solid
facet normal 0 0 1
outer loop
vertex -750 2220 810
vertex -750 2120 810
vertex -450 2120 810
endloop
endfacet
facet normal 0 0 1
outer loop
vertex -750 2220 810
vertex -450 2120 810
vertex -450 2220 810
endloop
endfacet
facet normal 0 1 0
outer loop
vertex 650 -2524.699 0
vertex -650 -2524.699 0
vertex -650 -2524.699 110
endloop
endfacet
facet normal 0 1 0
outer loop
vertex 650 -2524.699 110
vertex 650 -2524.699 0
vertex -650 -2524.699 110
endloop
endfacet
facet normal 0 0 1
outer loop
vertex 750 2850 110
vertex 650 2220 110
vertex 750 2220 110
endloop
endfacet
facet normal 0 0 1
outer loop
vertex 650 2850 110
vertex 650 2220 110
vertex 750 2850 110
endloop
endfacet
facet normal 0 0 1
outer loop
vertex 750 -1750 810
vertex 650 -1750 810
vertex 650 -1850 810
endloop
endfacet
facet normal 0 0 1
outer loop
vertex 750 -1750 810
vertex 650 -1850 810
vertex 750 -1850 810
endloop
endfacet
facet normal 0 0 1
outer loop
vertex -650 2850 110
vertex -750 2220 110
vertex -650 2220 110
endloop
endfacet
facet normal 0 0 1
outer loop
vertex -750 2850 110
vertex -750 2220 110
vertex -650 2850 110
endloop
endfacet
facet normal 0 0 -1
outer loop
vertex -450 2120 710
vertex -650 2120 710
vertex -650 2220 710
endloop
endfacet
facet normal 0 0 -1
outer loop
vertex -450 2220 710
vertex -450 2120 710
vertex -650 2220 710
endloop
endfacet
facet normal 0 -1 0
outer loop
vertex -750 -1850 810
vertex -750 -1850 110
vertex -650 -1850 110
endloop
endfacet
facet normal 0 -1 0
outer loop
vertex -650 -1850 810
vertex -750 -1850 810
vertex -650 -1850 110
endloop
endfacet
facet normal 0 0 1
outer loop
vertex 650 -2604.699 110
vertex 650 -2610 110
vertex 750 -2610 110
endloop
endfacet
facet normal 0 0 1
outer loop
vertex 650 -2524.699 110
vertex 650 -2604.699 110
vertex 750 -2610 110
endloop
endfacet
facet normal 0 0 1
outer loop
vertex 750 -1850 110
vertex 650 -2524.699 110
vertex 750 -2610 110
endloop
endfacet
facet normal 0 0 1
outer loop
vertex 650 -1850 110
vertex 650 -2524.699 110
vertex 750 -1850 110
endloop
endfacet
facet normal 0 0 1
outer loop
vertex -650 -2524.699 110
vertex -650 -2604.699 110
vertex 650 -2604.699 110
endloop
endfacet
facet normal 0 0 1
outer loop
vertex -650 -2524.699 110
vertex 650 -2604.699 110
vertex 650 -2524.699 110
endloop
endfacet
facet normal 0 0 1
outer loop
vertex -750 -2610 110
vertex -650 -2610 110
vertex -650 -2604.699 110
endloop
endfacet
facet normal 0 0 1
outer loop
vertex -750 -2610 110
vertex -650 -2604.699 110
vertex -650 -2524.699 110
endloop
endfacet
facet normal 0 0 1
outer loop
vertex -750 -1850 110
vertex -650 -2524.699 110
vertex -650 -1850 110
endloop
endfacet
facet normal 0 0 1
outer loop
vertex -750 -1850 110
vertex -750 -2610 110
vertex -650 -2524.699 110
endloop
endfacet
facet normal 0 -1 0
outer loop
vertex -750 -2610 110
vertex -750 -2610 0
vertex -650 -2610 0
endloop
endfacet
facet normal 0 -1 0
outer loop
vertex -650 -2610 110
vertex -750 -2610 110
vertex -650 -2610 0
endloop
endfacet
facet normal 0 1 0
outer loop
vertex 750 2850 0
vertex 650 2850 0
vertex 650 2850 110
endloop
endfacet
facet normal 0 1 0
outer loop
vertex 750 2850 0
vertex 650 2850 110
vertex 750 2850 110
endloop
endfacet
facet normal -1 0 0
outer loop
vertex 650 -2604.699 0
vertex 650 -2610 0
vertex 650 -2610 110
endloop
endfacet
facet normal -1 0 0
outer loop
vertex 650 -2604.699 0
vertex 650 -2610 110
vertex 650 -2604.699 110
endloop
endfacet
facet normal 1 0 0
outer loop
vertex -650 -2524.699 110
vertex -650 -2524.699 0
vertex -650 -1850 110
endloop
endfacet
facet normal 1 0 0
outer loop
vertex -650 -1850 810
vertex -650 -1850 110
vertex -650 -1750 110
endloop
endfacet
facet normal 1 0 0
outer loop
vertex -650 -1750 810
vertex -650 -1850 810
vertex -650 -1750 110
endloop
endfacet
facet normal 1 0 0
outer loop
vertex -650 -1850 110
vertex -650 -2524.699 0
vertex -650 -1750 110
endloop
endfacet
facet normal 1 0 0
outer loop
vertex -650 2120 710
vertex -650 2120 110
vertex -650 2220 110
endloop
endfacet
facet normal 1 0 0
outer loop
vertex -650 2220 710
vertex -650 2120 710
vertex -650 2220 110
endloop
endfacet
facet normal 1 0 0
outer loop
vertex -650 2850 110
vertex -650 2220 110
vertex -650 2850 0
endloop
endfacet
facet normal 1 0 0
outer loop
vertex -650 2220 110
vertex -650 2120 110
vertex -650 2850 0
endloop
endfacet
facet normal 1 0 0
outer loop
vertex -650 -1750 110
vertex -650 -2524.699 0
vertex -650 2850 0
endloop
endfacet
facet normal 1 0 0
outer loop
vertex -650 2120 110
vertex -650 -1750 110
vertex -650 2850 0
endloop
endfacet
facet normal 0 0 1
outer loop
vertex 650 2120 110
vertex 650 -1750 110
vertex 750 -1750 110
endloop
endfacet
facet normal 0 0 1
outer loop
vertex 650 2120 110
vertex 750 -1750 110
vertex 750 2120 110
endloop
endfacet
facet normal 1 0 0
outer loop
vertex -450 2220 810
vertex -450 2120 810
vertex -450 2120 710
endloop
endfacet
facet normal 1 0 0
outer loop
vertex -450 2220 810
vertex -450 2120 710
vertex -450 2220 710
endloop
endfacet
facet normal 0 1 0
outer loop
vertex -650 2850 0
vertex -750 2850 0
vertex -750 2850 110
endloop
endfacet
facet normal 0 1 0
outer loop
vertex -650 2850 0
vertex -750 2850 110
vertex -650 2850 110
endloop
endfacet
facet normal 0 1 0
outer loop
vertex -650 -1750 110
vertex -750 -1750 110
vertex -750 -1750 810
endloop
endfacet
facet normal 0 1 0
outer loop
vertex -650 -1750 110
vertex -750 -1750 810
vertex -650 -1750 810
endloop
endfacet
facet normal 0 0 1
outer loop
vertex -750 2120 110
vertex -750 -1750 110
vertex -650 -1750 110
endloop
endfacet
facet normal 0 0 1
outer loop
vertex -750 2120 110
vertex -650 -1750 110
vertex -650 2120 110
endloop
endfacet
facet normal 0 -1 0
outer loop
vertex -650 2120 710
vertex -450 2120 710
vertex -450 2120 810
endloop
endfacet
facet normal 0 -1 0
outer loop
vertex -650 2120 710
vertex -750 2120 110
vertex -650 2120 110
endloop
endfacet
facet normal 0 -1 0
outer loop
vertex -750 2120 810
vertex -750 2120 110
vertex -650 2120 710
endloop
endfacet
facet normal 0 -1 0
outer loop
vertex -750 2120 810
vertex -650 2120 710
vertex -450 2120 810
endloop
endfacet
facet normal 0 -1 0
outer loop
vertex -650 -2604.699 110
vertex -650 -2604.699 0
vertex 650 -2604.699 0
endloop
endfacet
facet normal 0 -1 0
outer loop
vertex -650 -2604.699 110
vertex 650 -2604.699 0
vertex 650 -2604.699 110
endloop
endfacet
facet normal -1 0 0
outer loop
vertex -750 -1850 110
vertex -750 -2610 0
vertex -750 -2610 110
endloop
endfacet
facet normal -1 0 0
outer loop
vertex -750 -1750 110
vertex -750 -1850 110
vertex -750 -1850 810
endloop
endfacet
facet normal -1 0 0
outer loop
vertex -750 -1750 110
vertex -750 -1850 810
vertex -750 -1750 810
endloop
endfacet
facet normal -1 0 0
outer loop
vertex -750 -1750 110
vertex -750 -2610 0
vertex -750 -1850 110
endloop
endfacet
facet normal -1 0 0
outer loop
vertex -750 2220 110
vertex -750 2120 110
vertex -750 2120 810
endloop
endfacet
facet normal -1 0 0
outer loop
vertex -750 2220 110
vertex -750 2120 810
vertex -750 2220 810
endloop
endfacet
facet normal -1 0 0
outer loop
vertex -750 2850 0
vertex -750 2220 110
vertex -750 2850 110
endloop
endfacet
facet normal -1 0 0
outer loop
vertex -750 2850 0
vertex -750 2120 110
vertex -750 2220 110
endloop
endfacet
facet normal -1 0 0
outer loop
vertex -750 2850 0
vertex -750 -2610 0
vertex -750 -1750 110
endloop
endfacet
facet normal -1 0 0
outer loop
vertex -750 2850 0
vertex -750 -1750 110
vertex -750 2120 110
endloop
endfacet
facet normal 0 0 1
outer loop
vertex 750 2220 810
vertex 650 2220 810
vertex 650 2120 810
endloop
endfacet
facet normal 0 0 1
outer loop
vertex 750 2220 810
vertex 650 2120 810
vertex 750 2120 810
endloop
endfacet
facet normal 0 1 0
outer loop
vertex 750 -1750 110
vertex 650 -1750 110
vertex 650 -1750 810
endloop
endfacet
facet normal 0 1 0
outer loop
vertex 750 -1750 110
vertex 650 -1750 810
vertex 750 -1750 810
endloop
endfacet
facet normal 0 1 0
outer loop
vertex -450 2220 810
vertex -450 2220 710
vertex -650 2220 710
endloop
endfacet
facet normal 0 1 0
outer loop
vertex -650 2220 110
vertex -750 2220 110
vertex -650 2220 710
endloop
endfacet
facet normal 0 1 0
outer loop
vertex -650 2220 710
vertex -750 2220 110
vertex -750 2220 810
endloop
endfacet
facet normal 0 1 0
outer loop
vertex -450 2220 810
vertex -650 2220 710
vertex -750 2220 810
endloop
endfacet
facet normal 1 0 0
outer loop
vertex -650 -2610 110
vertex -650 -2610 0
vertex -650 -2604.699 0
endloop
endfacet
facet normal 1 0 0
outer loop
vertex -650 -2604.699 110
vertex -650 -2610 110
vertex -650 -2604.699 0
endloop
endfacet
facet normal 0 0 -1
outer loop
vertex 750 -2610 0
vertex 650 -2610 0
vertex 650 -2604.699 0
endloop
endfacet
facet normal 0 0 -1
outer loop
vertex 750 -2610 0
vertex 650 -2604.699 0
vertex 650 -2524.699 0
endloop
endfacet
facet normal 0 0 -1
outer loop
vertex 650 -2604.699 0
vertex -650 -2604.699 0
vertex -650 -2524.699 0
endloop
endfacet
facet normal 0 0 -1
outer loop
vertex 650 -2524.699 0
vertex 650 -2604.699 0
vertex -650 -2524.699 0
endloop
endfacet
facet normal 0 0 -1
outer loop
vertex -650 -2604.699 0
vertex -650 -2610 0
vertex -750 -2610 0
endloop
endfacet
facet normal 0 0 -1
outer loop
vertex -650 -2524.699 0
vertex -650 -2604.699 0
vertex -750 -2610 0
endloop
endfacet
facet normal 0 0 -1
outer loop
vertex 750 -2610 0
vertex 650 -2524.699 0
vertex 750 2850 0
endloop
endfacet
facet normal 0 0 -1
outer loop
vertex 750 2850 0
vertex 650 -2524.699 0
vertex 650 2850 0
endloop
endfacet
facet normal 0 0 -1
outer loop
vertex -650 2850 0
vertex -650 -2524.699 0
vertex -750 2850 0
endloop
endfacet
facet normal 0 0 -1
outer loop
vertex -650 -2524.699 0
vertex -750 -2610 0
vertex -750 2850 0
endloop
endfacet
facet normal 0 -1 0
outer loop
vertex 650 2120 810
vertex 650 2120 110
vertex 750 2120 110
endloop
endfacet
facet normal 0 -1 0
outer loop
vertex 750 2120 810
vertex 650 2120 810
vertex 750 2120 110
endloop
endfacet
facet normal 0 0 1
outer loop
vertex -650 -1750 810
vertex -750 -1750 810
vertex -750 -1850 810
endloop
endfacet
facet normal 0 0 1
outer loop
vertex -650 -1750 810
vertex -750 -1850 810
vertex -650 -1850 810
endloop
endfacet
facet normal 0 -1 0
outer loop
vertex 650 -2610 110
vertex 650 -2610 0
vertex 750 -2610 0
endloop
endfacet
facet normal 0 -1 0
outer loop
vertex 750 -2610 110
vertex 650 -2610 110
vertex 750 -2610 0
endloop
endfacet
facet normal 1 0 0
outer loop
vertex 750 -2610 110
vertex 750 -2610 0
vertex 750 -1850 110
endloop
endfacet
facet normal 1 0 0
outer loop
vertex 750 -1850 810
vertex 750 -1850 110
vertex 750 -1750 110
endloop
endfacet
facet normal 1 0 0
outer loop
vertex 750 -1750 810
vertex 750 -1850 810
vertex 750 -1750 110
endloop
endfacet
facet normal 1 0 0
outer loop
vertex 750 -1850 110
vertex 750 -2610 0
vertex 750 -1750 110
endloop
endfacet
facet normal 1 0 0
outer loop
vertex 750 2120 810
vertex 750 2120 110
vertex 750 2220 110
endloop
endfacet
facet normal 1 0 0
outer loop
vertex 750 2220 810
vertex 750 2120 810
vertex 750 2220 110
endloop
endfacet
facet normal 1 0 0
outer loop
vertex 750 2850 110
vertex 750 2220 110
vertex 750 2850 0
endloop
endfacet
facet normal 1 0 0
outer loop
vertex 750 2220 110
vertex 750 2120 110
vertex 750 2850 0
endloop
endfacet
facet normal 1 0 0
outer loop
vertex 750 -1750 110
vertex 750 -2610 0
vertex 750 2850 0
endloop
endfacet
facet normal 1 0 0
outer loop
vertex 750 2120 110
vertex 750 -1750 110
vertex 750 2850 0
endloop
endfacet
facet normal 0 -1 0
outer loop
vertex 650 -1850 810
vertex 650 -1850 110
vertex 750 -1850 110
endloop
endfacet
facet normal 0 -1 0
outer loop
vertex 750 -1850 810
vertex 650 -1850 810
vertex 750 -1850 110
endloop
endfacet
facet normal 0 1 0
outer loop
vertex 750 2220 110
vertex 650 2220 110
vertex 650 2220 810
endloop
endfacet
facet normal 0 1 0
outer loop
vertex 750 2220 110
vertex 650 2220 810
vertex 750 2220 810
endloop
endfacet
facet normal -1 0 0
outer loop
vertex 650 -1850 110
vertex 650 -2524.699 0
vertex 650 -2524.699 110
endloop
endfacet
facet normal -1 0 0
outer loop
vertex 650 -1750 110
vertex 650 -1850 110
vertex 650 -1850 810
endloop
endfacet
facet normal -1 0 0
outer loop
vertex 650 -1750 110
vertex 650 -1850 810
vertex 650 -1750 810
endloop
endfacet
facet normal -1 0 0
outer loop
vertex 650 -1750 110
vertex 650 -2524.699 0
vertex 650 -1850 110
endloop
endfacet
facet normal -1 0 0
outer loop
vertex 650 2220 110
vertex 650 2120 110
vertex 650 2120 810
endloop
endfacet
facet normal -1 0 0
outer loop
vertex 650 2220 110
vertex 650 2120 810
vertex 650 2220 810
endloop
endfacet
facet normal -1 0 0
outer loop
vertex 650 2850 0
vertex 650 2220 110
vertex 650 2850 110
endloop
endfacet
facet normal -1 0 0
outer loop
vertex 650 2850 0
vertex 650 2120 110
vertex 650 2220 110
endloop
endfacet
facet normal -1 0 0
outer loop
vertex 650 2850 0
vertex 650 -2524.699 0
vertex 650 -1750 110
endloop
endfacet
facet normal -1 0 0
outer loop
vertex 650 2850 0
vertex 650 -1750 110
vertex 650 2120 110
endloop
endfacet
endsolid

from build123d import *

# Parameters (mm, degrees)
F0_W     = 100
F0_H     = 5700
F1_DEPTH = 110
F2_W     = 80
F2_H     = 110
F3_DEPTH = 1350
F4_W     = 100
F4_H     = 100
F5_DEPTH = 700
F6_DEPTH = 240
F7_W     = 100
F7_H     = 100
F8_DEPTH = 200


with BuildPart() as f1:
    # F0 (on Top) → F1 (new body)
    with BuildSketch(Plane.XY):
        with Locations((700, 0)):
            Rectangle(F0_W, F0_H)
    extrude(amount=F1_DEPTH)



with BuildPart() as f1b:
    # F0 (on Top) → F1, piece 2 (new body)
    with BuildSketch(Plane.XY):
        with Locations((-700, 0)):
            Rectangle(F0_W, F0_H)
    extrude(amount=F1_DEPTH)


with BuildPart() as f1_1:
    add(f1.part)

    add(f1b.part)  # F3 merges F1b
    # F2 (on face) → F3 (join)
    with BuildSketch(Plane.YZ.offset(-650)):
        with Locations((-2564.6993732452, 55)):
            Rectangle(F2_W, F2_H)
    extrude(amount=F3_DEPTH)

    # F4 (on face) → F5 (join)
    with BuildSketch(Plane.XY.offset(110)):
        with Locations((700, -1800)):
            Rectangle(F4_W, F4_H)
        with Locations((700, 2170)):
            Rectangle(F4_W, F4_H)
        with Locations((-700, -1800)):
            Rectangle(F4_W, F4_H)
        with Locations((-700, 2170)):
            Rectangle(F4_W, F4_H)
    extrude(amount=F5_DEPTH)

    # F6 (cut): faces of the model
    f6_faces = [f1_1.faces().sort_by_distance(p)[0] for p in [
        (700, -2850, 55),
        (-700, -2850, 55),
    ]]
    extrude(f6_faces, amount=-F6_DEPTH, mode=Mode.SUBTRACT)

    # F7 (on face) → F8 (join)
    with BuildSketch(Plane.YZ.offset(-650)):
        with Locations((2170, 760)):
            Rectangle(F7_W, F7_H)
    extrude(amount=F8_DEPTH)


solid = f1_1.part
